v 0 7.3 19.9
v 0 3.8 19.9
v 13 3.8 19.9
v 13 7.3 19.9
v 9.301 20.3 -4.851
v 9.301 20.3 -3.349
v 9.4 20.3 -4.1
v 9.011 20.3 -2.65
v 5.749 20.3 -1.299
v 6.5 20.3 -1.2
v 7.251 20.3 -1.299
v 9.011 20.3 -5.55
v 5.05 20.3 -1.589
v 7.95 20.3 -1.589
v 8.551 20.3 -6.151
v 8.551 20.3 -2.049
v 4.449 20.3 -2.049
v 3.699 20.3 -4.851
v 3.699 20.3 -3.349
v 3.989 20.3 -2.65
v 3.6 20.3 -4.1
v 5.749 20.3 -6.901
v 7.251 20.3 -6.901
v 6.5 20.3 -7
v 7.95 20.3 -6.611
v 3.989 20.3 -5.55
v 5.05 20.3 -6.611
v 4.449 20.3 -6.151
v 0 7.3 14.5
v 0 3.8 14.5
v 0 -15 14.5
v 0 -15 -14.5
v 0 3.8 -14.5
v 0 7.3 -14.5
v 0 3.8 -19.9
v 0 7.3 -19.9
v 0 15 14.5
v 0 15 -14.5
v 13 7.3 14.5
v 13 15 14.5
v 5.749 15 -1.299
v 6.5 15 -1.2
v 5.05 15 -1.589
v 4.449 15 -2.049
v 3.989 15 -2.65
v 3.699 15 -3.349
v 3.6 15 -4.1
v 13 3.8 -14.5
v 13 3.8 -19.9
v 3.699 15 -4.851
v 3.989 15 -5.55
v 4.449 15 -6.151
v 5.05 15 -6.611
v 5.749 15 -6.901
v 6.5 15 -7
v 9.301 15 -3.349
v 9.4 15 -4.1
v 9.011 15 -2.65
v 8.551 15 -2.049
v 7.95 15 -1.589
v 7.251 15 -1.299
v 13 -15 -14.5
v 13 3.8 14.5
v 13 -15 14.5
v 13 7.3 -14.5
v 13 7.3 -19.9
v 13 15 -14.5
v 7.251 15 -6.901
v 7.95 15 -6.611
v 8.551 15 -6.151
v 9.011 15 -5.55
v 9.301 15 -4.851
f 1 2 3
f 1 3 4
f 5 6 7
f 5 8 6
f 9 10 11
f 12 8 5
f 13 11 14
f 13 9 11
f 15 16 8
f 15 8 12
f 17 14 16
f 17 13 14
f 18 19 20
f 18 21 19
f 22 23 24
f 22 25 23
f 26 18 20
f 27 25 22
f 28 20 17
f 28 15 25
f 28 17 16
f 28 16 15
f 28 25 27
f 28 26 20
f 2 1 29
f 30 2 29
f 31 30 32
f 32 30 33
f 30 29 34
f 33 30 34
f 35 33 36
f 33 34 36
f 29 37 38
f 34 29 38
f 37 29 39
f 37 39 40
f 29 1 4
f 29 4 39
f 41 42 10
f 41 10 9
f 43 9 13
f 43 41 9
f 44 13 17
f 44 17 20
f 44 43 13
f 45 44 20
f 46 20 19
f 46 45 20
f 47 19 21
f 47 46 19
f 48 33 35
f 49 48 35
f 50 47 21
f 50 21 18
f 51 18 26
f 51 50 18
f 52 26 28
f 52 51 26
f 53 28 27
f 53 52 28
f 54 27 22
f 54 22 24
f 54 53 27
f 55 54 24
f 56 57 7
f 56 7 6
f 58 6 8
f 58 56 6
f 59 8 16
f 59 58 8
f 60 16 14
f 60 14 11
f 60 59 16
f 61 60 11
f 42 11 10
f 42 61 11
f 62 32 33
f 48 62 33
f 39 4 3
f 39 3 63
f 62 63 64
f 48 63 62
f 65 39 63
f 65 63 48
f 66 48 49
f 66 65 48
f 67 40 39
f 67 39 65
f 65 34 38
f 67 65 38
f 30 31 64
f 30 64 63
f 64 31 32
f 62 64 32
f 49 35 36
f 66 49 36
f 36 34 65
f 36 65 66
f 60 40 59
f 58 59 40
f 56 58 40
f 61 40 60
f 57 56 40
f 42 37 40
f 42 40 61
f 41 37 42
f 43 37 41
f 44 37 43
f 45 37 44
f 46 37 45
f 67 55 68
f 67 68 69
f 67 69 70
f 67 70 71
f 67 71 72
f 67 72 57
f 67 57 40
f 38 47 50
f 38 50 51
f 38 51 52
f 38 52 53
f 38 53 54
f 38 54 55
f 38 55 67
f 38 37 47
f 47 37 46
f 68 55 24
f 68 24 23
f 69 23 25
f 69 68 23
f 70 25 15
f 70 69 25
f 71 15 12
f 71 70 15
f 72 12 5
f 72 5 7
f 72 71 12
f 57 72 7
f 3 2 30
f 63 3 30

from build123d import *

# Parameters (mm, degrees)
SKETCH2_W           = 29
SKETCH2_H           = 30
SKETCH2_W_2         = 5.4
SKETCH2_H_2         = 3.5
SKETCH2_W_3         = 5.8
SKETCH2_H_3         = 5.3
BOSS_EXTRUDE1_DEPTH = 13
CUT_EXTRUDE1_DEPTH  = 5.3


with BuildPart() as part:
    # Sketch2 → Boss-Extrude1 (new body)
    with BuildSketch(Plane(origin=(0, 0, 0), x_dir=(0, 0, -1), z_dir=(1, 0, 0))):
        Rectangle(SKETCH2_W, SKETCH2_H)
        with Locations((-17.2, 5.55)):
            Rectangle(SKETCH2_W_2, SKETCH2_H_2)
        with Locations((4.1, 17.65)):
            Rectangle(SKETCH2_W_3, SKETCH2_H_3)
        with Locations((17.2, 5.55)):
            Rectangle(SKETCH2_W_2, SKETCH2_H_2)
    extrude(amount=BOSS_EXTRUDE1_DEPTH)

    # Sketch3 → Cut-Extrude1 (cut)
    with BuildSketch(Plane(origin=(0, 15, 0), x_dir=(1, 0, 0), z_dir=(0, 1, 0))):
        with BuildLine():
            Line((6.5, 1.2), (9.4, 1.2))
            Line((9.4, 1.2), (9.4, 4.1))
            ThreePointArc((9.4, 4.1), (8.550609665, 2.049390335), (6.5, 1.2))
        make_face()
        with BuildLine():
            ThreePointArc((6.5, 7), (8.550609665, 6.150609665), (9.4, 4.1))
            Line((9.4, 4.1), (9.4, 7))
            Line((9.4, 7), (6.5, 7))
        make_face()
        with BuildLine():
            ThreePointArc((3.6, 4.1), (4.449390335, 6.150609665), (6.5, 7))
            Line((6.5, 7), (3.6, 7))
            Line((3.6, 7), (3.6, 4.1))
        make_face()
        with BuildLine():
            Line((3.6, 1.2), (6.5, 1.2))
            ThreePointArc((6.5, 1.2), (4.449390335, 2.049390335), (3.6, 4.1))
            Line((3.6, 4.1), (3.6, 1.2))
        make_face()
        Polygon((0, 1.2), (3.6, 1.2), (3.6, 4.1), (3.6, 7), (0, 7), align=None)
        Polygon((9.4, 1.2), (13, 1.2), (13, 7), (9.4, 7), (9.4, 4.1), align=None)
    extrude(amount=CUT_EXTRUDE1_DEPTH, mode=Mode.SUBTRACT)


solid = part.part
